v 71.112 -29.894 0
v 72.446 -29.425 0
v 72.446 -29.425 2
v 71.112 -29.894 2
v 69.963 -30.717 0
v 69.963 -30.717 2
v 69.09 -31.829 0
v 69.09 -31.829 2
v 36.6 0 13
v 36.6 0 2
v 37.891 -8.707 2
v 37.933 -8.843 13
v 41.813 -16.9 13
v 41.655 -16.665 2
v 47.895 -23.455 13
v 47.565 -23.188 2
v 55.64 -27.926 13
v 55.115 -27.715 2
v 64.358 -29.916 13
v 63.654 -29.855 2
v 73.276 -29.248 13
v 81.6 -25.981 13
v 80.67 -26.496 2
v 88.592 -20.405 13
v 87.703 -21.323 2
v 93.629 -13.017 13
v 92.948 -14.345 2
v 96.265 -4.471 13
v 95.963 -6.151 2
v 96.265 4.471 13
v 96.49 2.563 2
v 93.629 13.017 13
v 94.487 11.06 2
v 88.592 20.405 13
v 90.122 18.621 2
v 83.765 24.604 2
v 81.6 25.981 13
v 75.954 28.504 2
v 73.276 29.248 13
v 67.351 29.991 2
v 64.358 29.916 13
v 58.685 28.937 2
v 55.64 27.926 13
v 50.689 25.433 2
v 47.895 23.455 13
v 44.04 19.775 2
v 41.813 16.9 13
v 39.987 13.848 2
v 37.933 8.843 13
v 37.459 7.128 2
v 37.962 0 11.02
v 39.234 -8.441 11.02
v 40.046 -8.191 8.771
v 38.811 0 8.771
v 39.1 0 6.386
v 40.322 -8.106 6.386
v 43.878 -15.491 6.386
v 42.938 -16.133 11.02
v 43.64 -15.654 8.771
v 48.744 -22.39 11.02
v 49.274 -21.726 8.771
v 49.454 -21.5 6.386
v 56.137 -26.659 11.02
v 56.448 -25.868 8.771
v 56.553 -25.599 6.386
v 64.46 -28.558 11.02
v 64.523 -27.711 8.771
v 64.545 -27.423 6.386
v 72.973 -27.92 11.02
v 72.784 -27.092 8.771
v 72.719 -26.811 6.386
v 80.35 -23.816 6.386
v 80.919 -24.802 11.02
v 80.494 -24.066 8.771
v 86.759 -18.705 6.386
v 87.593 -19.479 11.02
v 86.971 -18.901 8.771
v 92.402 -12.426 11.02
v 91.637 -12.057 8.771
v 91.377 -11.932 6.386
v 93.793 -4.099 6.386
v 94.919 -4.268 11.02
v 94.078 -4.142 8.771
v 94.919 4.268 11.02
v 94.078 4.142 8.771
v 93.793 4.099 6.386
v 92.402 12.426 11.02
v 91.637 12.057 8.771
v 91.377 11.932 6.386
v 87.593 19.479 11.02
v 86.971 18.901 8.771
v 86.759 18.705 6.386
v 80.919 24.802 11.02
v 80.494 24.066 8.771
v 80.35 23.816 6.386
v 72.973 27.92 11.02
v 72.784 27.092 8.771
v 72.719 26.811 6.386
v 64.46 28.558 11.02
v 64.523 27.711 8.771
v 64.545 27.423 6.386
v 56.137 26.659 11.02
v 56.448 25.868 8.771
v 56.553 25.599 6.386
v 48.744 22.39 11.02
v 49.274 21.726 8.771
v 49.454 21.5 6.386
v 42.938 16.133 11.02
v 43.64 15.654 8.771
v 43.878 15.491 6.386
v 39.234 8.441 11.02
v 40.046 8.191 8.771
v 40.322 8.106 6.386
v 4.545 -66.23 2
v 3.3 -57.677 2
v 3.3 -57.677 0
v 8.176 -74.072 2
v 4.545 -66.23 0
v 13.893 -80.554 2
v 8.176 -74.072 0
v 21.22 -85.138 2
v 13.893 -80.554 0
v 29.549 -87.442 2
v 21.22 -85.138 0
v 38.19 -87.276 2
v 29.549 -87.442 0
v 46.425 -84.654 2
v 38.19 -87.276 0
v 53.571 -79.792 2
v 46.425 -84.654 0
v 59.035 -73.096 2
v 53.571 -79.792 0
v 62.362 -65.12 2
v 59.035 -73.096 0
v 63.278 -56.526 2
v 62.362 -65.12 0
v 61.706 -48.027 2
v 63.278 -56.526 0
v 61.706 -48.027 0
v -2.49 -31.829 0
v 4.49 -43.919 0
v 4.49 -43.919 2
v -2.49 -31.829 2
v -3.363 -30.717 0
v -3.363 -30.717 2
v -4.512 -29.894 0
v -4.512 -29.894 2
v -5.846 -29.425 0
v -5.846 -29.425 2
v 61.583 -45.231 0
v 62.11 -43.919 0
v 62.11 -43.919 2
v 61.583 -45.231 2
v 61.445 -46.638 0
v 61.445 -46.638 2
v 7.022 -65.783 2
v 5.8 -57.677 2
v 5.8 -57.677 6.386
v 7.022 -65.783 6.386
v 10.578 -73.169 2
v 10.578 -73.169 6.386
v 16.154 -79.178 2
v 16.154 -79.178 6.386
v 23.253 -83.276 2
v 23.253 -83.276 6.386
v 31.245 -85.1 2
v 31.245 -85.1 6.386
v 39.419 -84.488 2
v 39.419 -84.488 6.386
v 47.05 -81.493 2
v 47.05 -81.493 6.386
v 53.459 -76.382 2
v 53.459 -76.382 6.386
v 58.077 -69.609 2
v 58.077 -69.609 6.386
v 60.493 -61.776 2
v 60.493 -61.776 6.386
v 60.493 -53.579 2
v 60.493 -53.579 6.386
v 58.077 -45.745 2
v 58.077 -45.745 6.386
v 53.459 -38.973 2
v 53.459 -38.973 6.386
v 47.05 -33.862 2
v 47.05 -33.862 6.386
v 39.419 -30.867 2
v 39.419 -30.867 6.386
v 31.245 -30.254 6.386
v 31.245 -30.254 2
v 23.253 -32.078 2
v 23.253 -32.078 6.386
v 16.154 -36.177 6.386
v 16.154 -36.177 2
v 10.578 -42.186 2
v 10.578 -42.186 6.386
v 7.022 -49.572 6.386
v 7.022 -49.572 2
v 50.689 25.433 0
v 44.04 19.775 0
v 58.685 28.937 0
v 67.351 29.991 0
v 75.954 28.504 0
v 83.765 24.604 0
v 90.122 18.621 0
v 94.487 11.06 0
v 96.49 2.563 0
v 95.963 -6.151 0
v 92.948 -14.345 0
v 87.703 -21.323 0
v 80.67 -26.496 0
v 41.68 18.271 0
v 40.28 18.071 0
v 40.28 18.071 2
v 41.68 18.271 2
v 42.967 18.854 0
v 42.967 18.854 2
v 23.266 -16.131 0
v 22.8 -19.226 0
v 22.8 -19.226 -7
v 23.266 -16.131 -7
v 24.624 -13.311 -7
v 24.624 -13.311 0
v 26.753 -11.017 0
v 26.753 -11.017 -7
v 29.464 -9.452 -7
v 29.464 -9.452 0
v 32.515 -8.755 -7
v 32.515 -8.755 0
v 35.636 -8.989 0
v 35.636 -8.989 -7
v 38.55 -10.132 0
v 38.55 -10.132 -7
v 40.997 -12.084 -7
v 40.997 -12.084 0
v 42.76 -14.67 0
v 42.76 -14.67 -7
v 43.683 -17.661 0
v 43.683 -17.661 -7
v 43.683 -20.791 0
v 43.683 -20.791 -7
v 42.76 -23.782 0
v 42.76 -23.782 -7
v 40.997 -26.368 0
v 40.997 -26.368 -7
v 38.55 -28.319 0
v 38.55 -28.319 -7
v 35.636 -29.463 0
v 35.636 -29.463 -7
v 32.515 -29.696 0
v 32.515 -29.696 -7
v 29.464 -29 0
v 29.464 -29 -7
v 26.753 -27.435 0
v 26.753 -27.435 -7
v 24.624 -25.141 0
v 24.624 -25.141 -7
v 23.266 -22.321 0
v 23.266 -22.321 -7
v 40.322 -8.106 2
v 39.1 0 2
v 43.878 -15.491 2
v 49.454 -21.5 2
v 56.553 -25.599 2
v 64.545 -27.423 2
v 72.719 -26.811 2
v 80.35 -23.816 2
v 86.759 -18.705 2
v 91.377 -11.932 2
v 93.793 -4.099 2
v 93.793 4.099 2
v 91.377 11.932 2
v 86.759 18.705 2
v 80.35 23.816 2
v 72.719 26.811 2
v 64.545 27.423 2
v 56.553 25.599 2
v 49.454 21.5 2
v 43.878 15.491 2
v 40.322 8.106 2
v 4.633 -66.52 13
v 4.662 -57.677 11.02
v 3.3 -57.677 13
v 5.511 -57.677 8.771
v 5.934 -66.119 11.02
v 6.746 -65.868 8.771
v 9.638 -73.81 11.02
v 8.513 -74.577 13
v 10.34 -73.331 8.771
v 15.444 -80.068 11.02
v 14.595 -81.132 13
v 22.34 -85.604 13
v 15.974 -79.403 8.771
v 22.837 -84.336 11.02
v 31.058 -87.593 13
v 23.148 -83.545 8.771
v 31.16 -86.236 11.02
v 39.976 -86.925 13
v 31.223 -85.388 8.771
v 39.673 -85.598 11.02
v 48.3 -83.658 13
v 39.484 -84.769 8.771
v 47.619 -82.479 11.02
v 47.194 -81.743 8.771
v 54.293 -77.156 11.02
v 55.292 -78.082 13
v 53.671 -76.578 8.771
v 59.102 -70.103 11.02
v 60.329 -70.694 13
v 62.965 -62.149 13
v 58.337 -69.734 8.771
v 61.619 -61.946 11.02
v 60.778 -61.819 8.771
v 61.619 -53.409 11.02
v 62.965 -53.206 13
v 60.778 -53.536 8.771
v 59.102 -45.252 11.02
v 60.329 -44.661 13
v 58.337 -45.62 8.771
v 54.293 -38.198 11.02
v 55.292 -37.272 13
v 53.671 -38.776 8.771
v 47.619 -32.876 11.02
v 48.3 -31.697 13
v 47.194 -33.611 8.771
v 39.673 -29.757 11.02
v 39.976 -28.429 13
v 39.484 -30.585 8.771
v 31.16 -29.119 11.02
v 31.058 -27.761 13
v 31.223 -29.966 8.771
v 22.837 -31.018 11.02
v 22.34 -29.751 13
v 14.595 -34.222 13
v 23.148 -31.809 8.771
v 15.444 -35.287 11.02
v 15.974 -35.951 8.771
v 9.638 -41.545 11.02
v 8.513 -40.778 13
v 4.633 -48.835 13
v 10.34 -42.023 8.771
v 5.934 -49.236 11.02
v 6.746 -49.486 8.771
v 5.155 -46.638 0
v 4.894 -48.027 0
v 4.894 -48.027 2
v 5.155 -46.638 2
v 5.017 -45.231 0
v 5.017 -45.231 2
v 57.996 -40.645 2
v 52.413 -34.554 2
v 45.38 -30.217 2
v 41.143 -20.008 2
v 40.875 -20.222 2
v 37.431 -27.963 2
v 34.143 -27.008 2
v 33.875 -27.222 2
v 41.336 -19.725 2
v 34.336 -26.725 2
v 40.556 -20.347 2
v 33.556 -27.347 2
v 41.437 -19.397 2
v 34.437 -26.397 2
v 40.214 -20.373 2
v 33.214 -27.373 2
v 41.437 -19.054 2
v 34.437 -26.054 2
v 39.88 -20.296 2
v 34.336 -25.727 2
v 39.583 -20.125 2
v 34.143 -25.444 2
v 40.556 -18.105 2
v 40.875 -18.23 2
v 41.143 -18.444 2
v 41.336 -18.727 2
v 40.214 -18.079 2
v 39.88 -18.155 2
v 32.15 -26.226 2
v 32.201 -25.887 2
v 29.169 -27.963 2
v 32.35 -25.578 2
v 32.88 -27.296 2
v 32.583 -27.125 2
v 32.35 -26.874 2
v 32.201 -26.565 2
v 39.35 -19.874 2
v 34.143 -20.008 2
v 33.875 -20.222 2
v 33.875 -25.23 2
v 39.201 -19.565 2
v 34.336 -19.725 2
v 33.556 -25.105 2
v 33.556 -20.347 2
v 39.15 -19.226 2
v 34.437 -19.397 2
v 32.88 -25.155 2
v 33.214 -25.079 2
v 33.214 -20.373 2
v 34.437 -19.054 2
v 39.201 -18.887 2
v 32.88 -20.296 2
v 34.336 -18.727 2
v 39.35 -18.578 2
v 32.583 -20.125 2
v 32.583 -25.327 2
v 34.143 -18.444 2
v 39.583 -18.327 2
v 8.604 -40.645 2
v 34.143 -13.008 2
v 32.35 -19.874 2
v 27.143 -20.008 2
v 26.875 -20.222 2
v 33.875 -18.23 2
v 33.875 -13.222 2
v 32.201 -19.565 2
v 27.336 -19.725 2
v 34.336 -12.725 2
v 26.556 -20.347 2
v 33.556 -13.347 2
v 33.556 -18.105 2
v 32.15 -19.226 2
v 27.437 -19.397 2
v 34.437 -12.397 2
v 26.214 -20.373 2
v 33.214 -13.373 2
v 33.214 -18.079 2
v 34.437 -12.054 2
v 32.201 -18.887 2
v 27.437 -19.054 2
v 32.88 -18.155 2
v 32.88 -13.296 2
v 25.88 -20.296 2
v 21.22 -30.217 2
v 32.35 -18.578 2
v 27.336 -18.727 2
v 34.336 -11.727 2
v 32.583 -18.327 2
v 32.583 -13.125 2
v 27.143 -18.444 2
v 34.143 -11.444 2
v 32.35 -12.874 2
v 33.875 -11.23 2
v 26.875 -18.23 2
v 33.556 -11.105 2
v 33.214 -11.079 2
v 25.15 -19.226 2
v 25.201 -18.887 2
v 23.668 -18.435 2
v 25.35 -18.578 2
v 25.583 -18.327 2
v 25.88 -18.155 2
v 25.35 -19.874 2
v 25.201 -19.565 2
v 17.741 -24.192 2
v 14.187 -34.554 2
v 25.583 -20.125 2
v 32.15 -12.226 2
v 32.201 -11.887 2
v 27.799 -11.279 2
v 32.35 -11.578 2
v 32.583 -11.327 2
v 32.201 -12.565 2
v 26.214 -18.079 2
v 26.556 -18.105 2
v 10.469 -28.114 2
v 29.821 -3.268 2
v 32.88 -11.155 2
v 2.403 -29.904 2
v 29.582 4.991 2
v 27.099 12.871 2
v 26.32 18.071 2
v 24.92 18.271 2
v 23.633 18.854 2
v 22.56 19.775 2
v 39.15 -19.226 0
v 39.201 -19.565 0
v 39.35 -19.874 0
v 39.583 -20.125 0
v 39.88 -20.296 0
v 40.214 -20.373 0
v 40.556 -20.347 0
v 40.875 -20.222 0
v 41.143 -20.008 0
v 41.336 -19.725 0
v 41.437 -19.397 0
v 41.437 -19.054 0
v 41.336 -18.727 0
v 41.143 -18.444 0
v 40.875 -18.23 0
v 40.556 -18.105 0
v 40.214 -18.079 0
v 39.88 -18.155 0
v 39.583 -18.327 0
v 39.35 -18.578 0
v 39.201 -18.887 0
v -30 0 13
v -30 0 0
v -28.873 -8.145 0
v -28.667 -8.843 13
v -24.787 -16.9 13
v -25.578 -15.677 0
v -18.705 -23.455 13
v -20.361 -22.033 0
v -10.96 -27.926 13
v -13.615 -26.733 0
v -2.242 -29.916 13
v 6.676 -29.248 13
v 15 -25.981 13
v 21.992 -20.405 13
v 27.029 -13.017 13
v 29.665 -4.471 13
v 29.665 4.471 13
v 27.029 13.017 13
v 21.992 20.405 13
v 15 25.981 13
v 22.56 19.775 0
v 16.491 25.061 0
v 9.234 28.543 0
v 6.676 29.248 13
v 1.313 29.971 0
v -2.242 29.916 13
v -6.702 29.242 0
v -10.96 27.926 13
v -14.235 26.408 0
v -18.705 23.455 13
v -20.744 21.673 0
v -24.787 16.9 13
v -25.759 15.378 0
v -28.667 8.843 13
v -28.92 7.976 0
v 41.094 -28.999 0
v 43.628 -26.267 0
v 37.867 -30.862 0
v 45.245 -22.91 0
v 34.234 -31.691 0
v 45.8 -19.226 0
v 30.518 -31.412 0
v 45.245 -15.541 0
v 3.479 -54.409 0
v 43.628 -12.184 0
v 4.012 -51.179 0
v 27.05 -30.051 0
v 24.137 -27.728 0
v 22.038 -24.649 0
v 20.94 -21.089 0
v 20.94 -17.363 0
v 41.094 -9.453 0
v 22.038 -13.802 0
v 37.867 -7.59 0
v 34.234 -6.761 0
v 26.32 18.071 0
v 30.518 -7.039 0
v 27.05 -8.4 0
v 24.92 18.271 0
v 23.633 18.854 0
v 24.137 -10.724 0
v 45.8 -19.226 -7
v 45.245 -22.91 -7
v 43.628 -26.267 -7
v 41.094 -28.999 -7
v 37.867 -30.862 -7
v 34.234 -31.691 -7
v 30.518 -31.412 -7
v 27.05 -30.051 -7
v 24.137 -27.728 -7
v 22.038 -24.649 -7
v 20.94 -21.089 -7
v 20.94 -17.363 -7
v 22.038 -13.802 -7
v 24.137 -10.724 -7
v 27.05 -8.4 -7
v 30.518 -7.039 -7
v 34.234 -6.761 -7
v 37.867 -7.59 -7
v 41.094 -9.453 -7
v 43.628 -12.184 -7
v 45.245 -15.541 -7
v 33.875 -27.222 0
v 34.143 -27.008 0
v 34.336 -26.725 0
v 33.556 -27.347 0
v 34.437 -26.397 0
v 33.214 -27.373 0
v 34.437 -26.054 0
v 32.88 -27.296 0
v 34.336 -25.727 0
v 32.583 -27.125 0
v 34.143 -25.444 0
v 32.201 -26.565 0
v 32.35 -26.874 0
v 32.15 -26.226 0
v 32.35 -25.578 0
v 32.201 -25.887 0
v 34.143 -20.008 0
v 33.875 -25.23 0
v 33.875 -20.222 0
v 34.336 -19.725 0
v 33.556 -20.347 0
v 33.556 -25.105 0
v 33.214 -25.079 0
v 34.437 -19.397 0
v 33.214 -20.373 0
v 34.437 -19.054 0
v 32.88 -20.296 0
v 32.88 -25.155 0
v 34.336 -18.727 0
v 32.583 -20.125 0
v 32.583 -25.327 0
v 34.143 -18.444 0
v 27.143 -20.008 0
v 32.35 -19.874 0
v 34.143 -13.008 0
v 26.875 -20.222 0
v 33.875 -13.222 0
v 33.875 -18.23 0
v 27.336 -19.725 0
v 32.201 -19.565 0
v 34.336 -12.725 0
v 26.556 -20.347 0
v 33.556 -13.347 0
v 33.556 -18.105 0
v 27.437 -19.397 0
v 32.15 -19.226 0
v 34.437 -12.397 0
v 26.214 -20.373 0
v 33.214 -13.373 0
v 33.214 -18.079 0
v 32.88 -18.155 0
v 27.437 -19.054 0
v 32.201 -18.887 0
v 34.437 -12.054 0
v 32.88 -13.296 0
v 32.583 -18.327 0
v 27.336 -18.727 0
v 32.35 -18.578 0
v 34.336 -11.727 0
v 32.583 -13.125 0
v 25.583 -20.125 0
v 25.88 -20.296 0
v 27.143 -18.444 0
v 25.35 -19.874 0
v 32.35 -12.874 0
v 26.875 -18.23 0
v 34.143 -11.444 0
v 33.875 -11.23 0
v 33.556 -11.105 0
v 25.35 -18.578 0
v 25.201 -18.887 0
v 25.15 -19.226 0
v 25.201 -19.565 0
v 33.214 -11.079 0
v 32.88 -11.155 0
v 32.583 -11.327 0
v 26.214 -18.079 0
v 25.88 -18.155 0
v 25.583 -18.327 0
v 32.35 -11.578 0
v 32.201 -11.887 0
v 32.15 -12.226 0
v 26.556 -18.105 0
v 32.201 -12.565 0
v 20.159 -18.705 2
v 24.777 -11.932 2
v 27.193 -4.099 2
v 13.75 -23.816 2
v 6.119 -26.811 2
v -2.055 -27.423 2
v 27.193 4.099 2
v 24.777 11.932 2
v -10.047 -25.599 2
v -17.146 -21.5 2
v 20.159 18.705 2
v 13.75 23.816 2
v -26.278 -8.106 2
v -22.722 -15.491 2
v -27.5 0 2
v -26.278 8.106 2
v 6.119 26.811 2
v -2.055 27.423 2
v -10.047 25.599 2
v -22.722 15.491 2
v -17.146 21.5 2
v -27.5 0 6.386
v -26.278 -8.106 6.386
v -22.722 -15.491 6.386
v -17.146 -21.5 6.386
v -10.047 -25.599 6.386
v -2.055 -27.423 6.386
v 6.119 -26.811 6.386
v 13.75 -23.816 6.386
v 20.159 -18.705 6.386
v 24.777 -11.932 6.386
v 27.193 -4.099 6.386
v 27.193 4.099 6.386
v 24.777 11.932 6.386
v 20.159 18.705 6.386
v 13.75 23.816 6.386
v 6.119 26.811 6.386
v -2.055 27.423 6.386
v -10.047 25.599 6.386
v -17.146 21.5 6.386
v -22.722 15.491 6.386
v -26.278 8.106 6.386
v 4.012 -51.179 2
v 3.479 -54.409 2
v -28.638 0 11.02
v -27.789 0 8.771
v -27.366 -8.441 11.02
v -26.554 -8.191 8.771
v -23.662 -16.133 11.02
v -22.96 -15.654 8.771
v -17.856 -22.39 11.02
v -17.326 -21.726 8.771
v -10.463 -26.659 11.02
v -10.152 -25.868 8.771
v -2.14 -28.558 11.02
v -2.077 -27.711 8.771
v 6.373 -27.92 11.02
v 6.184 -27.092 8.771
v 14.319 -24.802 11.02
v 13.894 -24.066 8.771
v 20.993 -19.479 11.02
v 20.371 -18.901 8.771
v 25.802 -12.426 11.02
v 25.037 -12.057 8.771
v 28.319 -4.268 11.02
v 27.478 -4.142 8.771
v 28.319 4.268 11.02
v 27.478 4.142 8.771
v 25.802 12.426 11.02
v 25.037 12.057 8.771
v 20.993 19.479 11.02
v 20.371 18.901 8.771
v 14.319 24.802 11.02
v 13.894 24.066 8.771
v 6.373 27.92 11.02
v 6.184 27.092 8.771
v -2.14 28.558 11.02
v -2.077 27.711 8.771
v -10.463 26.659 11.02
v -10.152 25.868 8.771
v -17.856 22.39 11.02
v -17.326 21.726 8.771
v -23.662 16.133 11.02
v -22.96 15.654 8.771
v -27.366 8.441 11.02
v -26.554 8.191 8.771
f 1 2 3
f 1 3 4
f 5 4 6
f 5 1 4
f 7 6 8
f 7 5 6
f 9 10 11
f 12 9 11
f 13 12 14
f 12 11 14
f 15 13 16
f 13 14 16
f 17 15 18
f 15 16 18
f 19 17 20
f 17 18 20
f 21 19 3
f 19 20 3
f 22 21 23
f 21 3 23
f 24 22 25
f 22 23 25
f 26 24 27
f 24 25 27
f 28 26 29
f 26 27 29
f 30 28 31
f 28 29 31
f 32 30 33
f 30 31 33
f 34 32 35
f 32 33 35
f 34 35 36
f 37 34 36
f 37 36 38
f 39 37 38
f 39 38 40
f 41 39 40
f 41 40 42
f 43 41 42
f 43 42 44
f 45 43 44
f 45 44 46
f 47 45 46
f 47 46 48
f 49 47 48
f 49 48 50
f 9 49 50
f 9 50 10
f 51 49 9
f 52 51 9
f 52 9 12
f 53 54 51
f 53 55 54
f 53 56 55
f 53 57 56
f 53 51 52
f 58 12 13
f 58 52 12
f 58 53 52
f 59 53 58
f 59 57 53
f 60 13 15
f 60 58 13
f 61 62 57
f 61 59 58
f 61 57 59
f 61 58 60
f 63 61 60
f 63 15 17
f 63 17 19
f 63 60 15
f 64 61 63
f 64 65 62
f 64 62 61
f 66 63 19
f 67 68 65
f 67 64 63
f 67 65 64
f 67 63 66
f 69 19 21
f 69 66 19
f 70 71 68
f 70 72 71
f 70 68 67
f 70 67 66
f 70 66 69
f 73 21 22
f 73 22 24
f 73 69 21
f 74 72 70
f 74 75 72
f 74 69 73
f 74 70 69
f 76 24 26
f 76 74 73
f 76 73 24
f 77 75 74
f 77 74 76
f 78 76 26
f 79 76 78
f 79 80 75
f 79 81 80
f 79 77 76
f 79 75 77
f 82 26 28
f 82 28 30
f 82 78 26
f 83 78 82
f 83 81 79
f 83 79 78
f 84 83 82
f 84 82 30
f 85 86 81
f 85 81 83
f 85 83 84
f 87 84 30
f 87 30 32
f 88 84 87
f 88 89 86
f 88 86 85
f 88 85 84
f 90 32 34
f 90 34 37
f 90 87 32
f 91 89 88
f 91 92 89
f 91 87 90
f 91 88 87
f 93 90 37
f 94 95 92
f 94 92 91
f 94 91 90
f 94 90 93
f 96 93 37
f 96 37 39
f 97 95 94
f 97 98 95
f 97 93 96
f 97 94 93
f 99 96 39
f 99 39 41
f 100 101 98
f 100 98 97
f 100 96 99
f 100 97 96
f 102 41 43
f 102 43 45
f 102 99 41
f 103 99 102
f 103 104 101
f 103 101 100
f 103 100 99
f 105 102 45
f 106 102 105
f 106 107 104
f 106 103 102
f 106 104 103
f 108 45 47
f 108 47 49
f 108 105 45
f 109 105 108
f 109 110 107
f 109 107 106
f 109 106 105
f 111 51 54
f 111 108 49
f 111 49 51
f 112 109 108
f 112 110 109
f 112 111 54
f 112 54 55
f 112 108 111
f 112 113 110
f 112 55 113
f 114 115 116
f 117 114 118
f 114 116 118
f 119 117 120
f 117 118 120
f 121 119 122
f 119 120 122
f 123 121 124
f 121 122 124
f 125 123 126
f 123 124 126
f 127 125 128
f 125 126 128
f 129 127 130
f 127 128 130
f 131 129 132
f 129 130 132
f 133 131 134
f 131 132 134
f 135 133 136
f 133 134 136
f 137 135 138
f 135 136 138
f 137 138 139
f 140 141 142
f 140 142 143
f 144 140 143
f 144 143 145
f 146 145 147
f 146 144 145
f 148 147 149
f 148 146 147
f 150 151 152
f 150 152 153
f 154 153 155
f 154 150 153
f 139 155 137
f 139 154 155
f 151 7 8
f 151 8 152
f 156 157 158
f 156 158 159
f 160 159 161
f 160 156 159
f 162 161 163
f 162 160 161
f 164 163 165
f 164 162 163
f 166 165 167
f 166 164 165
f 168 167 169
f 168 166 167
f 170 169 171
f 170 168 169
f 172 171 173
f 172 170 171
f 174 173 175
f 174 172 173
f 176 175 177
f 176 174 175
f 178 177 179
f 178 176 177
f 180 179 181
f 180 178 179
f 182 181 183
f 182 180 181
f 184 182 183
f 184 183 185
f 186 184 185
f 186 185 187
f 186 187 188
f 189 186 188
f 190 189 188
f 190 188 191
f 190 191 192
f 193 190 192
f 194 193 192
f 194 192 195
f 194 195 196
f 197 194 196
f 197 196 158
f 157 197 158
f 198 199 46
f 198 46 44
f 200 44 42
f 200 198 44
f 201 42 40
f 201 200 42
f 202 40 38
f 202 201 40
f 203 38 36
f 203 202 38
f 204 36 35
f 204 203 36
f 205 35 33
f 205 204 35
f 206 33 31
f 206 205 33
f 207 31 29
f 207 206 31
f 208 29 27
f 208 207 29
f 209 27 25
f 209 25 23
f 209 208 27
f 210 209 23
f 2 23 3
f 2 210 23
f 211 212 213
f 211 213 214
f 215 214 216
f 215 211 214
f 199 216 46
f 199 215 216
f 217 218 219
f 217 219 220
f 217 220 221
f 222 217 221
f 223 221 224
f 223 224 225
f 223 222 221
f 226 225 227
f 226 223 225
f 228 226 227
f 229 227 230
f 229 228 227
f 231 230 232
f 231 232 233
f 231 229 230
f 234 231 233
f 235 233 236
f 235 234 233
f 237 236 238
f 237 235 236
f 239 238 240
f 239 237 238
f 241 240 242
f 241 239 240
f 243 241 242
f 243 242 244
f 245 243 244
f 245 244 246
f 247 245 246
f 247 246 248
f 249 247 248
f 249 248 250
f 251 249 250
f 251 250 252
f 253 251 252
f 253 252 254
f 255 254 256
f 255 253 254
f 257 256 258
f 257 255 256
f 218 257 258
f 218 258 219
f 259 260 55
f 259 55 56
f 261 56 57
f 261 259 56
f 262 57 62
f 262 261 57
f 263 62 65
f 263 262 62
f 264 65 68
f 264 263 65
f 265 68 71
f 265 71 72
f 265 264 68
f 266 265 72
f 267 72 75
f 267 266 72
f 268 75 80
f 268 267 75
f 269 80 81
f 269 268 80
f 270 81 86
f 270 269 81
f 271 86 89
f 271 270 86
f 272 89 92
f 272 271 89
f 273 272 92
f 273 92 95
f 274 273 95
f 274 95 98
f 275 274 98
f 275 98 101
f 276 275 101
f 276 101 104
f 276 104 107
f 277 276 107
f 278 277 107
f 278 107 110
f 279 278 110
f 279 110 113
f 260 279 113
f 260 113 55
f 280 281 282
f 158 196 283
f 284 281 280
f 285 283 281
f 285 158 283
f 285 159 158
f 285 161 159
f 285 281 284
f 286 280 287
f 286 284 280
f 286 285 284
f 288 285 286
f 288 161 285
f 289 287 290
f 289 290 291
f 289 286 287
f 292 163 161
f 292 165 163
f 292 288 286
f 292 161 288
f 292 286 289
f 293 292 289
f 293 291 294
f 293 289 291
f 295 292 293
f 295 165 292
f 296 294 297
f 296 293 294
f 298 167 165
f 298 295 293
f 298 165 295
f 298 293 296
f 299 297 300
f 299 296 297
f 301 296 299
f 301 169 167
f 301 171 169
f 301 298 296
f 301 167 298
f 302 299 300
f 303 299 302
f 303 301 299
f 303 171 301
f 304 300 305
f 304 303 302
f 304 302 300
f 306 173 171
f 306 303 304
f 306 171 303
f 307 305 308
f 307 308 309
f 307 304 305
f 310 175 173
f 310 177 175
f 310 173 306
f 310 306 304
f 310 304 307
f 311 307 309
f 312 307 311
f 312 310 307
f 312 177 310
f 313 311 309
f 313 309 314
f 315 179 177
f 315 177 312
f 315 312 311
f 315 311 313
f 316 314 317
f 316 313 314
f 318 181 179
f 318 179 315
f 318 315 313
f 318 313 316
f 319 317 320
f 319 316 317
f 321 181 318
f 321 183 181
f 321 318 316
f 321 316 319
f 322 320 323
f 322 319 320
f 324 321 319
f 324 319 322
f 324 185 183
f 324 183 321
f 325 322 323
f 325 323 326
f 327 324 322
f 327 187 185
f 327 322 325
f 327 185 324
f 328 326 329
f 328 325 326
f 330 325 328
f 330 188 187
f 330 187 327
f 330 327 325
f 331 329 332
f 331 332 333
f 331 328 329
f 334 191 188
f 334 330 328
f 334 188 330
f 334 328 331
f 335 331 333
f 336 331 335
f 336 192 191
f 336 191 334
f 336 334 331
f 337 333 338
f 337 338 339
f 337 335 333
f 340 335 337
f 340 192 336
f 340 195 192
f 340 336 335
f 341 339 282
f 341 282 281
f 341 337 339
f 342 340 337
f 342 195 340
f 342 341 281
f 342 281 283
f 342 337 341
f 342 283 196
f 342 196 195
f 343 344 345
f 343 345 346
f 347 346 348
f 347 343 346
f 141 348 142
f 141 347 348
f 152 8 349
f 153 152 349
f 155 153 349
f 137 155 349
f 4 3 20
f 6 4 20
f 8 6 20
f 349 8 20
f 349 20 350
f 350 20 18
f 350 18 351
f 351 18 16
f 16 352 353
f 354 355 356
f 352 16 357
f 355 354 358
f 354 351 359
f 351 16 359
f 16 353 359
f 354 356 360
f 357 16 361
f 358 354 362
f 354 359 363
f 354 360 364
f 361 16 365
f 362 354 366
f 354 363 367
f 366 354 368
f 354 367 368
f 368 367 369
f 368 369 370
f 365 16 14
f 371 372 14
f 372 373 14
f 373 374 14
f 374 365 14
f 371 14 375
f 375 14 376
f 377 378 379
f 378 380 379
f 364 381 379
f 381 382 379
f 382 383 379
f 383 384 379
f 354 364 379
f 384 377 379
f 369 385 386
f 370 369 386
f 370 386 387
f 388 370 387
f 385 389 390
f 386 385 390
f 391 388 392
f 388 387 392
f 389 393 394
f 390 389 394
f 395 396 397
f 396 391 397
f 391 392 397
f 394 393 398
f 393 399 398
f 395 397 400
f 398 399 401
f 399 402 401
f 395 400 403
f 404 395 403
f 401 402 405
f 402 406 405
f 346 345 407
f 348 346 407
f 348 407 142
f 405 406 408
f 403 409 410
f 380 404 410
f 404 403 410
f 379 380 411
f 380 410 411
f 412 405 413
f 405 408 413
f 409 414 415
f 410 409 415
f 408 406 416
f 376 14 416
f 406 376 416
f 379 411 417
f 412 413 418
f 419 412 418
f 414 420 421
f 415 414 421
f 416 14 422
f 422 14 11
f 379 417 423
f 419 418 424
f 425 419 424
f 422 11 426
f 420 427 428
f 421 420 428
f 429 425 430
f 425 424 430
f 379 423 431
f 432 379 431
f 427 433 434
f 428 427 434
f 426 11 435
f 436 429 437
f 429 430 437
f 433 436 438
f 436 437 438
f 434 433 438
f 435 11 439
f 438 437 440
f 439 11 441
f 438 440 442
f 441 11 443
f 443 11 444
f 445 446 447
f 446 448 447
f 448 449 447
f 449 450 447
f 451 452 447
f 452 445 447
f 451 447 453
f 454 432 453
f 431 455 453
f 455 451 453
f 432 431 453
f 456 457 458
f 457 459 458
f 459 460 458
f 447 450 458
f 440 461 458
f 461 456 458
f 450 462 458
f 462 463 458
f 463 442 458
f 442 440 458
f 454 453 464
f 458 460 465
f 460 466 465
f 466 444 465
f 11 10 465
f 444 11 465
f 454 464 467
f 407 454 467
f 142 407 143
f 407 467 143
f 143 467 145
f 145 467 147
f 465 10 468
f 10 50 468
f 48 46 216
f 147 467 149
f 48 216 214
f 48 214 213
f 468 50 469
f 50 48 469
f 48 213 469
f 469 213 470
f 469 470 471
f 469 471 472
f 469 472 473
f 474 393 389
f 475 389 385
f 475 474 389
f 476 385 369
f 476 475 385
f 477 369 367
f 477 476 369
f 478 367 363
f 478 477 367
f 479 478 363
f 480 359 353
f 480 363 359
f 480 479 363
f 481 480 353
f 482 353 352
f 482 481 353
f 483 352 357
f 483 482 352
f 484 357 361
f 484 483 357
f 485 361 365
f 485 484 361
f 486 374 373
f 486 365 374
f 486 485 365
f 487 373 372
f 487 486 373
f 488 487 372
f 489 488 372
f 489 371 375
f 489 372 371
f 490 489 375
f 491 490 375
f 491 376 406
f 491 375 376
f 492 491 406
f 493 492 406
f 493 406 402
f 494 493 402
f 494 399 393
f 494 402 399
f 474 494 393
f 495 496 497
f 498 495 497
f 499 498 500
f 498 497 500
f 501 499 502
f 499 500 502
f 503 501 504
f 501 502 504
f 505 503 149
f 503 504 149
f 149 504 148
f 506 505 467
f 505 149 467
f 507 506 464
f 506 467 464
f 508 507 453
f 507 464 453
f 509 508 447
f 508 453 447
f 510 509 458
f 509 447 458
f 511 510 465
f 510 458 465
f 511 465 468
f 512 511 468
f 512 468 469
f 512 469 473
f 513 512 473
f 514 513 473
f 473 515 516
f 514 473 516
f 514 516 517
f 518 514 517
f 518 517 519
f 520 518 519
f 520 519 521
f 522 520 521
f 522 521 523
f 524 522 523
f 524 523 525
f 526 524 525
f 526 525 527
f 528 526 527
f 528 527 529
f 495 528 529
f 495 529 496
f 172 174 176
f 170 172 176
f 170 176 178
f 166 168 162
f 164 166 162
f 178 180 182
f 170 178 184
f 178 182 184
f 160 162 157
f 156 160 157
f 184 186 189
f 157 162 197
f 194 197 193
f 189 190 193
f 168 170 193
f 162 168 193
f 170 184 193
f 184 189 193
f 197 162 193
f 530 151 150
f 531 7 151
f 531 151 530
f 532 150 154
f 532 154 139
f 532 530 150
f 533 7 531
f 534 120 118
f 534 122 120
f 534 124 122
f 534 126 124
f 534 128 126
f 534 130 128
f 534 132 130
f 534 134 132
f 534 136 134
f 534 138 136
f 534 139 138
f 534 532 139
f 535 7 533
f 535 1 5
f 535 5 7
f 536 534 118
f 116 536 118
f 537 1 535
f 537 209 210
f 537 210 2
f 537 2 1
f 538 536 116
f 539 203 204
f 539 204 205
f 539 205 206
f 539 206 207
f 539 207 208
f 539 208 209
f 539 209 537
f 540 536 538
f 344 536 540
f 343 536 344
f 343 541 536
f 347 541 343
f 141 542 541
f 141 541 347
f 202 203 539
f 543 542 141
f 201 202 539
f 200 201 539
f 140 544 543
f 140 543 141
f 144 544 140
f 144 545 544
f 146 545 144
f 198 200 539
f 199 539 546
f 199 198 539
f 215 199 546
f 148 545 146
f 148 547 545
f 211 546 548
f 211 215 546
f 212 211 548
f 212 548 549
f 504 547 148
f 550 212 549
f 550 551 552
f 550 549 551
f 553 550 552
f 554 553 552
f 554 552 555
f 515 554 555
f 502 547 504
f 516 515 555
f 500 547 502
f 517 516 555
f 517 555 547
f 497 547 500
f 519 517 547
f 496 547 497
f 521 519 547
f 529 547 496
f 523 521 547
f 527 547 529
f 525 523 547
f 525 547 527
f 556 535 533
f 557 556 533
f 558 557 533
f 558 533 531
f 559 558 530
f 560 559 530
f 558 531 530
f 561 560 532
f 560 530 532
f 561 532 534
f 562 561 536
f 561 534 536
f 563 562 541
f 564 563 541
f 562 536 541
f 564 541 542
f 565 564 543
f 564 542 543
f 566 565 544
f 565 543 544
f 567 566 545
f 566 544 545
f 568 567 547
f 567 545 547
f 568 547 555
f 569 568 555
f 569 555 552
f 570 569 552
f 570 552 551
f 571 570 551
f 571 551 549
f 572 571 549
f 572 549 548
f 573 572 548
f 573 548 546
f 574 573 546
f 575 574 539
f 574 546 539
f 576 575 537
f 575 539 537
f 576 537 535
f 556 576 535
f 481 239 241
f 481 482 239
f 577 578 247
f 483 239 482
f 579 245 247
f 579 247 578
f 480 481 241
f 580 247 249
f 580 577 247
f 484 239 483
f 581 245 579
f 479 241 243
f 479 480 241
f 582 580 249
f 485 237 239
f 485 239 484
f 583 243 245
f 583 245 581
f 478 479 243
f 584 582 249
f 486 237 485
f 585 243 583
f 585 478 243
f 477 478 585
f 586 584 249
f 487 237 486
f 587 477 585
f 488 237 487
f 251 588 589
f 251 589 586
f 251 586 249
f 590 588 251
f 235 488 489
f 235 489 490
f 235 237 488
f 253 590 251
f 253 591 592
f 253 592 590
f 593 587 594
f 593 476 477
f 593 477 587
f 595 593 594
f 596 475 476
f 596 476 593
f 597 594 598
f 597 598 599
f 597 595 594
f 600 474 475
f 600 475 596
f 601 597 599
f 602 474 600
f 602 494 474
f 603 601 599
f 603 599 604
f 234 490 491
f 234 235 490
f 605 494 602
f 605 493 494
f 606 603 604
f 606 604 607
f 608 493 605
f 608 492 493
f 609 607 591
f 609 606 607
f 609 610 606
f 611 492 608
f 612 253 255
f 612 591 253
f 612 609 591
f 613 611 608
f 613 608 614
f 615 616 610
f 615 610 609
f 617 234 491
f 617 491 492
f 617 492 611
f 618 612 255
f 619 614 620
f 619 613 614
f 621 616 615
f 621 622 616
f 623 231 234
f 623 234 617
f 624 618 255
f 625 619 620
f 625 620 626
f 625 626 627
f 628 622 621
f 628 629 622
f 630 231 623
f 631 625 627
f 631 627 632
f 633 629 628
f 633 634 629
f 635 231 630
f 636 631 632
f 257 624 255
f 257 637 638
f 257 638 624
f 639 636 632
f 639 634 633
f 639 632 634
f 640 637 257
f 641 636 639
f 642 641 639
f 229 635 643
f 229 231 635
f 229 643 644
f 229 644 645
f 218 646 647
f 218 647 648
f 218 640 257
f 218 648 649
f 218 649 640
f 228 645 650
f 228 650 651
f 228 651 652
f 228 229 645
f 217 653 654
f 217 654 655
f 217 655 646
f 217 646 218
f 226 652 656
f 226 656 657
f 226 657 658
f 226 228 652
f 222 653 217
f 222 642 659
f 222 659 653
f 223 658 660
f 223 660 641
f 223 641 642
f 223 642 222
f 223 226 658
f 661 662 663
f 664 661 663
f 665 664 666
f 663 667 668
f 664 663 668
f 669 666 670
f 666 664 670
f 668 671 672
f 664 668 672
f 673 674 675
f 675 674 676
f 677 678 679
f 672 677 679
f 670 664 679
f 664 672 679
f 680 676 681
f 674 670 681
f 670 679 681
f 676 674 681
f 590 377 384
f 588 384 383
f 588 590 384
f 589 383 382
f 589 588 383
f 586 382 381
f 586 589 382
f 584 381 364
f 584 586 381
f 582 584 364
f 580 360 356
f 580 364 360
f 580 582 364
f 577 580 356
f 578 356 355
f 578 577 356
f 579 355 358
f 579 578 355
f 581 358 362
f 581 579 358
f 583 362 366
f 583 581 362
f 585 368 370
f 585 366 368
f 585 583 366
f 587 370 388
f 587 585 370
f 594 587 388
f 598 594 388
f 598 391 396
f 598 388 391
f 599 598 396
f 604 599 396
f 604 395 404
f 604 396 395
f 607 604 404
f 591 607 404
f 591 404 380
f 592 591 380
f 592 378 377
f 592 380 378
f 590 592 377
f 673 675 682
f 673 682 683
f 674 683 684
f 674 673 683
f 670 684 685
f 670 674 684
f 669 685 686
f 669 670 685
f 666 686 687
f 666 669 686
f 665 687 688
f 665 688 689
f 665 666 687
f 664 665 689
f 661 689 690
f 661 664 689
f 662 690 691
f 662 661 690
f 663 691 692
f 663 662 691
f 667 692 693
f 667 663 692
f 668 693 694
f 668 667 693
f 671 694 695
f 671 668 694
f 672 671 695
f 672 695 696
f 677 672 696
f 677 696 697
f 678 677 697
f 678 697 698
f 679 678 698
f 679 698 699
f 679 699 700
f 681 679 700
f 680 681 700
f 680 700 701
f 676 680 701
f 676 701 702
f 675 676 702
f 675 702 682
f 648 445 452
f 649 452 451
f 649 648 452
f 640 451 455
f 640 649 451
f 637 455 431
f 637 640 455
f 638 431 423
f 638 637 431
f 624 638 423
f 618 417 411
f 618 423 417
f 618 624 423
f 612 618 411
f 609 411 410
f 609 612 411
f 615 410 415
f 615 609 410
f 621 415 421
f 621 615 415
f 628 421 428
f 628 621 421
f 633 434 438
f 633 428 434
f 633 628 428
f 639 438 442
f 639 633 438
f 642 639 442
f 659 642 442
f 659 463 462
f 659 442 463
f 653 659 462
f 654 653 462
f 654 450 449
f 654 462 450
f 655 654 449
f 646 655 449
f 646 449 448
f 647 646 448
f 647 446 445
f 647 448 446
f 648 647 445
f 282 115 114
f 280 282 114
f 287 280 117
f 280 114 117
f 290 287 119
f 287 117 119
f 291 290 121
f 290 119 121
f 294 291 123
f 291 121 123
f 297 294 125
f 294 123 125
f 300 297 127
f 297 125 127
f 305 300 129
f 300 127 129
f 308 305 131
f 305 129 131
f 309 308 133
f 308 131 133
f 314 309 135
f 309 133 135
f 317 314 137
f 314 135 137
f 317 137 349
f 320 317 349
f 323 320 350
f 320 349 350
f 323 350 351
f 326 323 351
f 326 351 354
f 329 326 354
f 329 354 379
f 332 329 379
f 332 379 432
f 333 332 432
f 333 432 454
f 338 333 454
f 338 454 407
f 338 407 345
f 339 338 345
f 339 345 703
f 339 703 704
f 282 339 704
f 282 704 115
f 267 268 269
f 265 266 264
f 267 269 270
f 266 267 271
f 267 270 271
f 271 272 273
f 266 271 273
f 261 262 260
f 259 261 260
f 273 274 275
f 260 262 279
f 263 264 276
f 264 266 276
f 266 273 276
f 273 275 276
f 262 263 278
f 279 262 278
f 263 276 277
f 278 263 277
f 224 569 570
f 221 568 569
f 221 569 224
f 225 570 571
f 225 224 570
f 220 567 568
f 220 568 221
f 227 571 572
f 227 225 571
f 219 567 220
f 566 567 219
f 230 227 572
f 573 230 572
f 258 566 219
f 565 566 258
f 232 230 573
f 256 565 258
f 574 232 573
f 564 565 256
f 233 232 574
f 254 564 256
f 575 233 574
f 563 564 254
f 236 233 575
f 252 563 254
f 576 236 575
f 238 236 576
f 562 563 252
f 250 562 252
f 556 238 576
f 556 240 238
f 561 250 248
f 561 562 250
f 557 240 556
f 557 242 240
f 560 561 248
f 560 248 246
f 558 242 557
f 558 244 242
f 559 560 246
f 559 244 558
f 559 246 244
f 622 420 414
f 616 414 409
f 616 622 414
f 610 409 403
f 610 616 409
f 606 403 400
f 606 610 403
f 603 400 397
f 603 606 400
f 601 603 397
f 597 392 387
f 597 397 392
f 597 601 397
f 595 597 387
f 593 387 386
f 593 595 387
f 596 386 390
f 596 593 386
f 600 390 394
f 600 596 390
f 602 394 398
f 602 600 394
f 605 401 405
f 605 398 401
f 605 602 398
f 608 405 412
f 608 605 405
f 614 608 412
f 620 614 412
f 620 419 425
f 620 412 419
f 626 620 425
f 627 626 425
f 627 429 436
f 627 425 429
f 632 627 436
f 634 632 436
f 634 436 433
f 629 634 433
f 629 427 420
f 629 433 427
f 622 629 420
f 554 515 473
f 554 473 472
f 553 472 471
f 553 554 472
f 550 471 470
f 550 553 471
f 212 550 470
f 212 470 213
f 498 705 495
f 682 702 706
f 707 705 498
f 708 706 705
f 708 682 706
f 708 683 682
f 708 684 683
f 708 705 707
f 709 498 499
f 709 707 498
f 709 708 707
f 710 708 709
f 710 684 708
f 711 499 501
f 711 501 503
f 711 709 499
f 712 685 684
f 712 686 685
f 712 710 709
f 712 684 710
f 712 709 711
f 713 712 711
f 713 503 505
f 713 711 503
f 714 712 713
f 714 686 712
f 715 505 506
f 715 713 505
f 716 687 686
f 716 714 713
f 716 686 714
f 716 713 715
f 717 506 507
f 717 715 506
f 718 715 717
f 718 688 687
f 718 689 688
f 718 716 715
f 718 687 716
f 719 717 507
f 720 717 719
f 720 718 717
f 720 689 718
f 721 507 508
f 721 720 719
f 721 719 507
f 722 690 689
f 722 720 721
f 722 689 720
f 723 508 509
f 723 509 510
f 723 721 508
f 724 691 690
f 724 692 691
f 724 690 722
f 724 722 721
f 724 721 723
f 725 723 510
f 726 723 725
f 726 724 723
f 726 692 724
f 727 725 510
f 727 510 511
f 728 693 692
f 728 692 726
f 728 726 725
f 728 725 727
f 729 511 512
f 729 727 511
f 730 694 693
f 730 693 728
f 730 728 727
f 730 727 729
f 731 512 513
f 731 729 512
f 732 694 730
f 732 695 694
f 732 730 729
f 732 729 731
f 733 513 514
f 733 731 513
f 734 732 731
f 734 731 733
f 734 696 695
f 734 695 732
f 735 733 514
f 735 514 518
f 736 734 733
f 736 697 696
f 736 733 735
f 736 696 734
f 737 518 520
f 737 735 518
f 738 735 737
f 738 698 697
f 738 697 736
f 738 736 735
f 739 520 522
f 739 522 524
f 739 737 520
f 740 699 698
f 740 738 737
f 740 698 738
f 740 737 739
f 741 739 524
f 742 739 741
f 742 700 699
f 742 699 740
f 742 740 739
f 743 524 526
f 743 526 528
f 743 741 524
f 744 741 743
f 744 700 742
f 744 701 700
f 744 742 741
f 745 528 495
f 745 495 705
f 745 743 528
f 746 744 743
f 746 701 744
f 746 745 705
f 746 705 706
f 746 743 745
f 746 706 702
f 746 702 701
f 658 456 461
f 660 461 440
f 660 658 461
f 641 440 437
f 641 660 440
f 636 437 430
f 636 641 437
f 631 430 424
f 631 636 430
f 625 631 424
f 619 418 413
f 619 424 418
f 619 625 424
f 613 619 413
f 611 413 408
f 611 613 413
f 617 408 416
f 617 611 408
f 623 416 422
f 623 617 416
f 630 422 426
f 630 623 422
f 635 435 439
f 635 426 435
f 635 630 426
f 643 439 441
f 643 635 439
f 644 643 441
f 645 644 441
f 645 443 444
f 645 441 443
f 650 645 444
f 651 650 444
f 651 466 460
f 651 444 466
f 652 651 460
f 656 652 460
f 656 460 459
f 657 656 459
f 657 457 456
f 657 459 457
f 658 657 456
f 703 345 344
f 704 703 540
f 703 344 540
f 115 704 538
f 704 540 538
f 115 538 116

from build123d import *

# Parameters (mm, degrees)
SKETCH_1_R          = 30
SKETCH_1_R_2        = 27.5
EXTRUDE_1_DEPTH     = 13
SKETCH_1_R_3        = 29.999999999999996
EXTRUDE_1_2_DEPTH   = 13
EXTRUDE_1_3_DEPTH   = 13
EXTRUDE_2_DEPTH     = 2
SKETCH_3_R          = 1.149999999999996
SKETCH_3_R_2        = 1.1499999999999966
SKETCH_3_R_3        = 1.1500000000000037
CUT_EXTRUDE_5_DEPTH = 132.10250765535577
FILLET_1_R          = 10
SKETCH_5_R          = 12.500000000000002
SKETCH_5_R_2        = 10.5
EXTRUDE_3_DEPTH     = 7


with BuildPart() as part:
    # 草图1 → 凸台-拉伸1 (new body)
    with BuildSketch(Plane.XY):
        with Locations(Location((0, 0, 0), (0, 0, 180))):
            Circle(SKETCH_1_R)
        with Locations(Location((0, 0, 0), (0, 0, 180))):
            Circle(SKETCH_1_R_2, mode=Mode.SUBTRACT)
    extrude(amount=EXTRUDE_1_DEPTH)



with BuildPart() as body_2:
    # 草图1 → Extrude 1 2 (new body)
    with BuildSketch(Plane.XY):
        with Locations(Location((66.6, 0, 0), (0, 0, 180))):
            Circle(SKETCH_1_R_3)
        with Locations(Location((66.6, 0, 0), (0, 0, 180))):
            Circle(SKETCH_1_R_2, mode=Mode.SUBTRACT)
    extrude(amount=EXTRUDE_1_2_DEPTH)


with BuildPart() as body_3:
    # 草图1 → Extrude 1 3 (new body)
    with BuildSketch(Plane.XY):
        with Locations(Location((33.30000000000001, -57.6772918920436, 0), (0, 0, 180))):
            Circle(SKETCH_1_R_3)
        with Locations(Location((33.30000000000001, -57.6772918920436, 0), (0, 0, 180))):
            Circle(SKETCH_1_R_2, mode=Mode.SUBTRACT)
    extrude(amount=EXTRUDE_1_3_DEPTH)


with BuildPart() as part_1:
    add(part.part)

    add(body_2.part)  # 凸台-拉伸2 merges body 2

    add(body_3.part)  # 凸台-拉伸2 merges body 3
    # 草图2 → 凸台-拉伸2 (add)
    with BuildSketch(Plane.XY):
        with BuildLine():
            Line((26.3198925252566, 18.070831312697457), (40.280107474743396, 18.070831312697457))
            ThreePointArc((40.280107474743396, 18.070831312697457), (42.3441853289733, 18.516758123597654), (44.04009212120862, 19.77499826802639))
            ThreePointArc((44.04009212120862, 19.77499826802639), (92.58076211353317, 15), (72.44569692050842, -29.424952464083248))
            ThreePointArc((72.44569692050842, -29.424952464083248), (70.50807559525407, -30.264530756395246), (69.08985272167097, -31.829111208097117))
            Line((69.08985272167097, -31.829111208097117), (62.10974524692759, -43.91901199664395))
            ThreePointArc((62.10974524692759, -43.91901199664395), (61.46389026628078, -45.92951925924603), (61.70560479929982, -48.027337695986766))
            ThreePointArc((61.70560479929982, -48.027337695986766), (33.300000000000004, -87.6772918920436), (4.894395200700185, -48.02733769598677))
            ThreePointArc((4.894395200700185, -48.02733769598677), (5.13610973371921, -45.92951925924604), (4.4902547530724135, -43.91901199664397))
            Line((4.4902547530724135, -43.91901199664397), (-2.489852721670984, -31.829111208097103))
            ThreePointArc((-2.489852721670984, -31.829111208097103), (-3.9080755952540875, -30.264530756395228), (-5.845696920508439, -29.42495246408323))
            ThreePointArc((-5.845696920508439, -29.42495246408323), (-25.980762113533153, 15.000000000000009), (22.55990787879137, 19.77499826802639))
            ThreePointArc((22.55990787879137, 19.77499826802639), (24.25581467102669, 18.516758123597654), (26.3198925252566, 18.070831312697457))
        make_face()
    extrude(amount=EXTRUDE_2_DEPTH)

    # 草图3 → 切除-拉伸5 (cut, through all)
    with BuildSketch(Plane.XY):
        with Locations(Location((33.3, -19.225763964014533, 0), (0, 0, 180))):
            Circle(SKETCH_3_R)
        with Locations(Location((33.3, -12.225763964014533, 0), (0, 0, 180))):
            Circle(SKETCH_3_R_2)
        with Locations(Location((40.3, -19.225763964014533, 0), (0, 0, 180))):
            Circle(SKETCH_3_R)
        with Locations(Location((33.3, -26.22576396401453, 0), (0, 0, 180))):
            Circle(SKETCH_3_R)
        with Locations(Location((26.299999999999997, -19.225763964014533, 0), (0, 0, 180))):
            Circle(SKETCH_3_R_3)
    extrude(amount=CUT_EXTRUDE_5_DEPTH, mode=Mode.SUBTRACT)

    # 圆角1
    # the kernel refuses this fillet: 10 mm, written as the material it takes off along each edge
    with BuildSketch(Plane(origin=(0, 0, 13), x_dir=(-1, 1.2e-16, 0), z_dir=(1.2e-16, 1, 0))) as fillet_1_piece_1:
        with BuildLine():
            CenterArc((37.5, -6.614378277661482), FILLET_1_R, 138.59037789072914, 41.409622109270856)
            Line((27.5, -6.614378277661482), (27.3, -6.614378277661482))
            Line((27.3, -6.614378277661482), (27.3, 0))
            Line((27.3, 0), (27.5, 0.1999999999999993))
            ThreePointArc((27.5, 0.1999999999999993), (28.75, 0.1999999999999993), (29.85, 0.1322875655532254))
            Line((29.85, 0.1322875655532254), (30, -3.55e-15))
        make_face()
    revolve(axis=Axis((0, 0, 13), (0, 0, 1)), mode=Mode.SUBTRACT)
    with BuildSketch(Plane(origin=(66.6, 0, 13), x_dir=(-1, 1.2e-16, 0), z_dir=(1.2e-16, 1, 0))) as fillet_1_piece_2:
        with BuildLine():
            CenterArc((37.5, -6.614378277661482), FILLET_1_R, 138.59037789072914, 41.409622109270856)
            Line((27.5, -6.614378277661482), (27.299999999999997, -6.614378277661482))
            Line((27.299999999999997, -6.614378277661482), (27.299999999999997, 0))
            Line((27.299999999999997, 0), (27.5, 0.1999999999999993))
            ThreePointArc((27.5, 0.1999999999999993), (28.75, 0.1999999999999993), (29.85, 0.1322875655532254))
            Line((29.85, 0.1322875655532254), (30, -3.55e-15))
        make_face()
    revolve(axis=Axis((66.6, 0, 13), (0, 0, 1)), mode=Mode.SUBTRACT)
    with BuildSketch(Plane(origin=(33.30000000000001, -57.6772918920436, 13), x_dir=(-1, 0, 0), z_dir=(0, 1, 0))) as fillet_1_piece_3:
        with BuildLine():
            CenterArc((37.5, -6.614378277661478), FILLET_1_R, 138.59037789072914, 41.409622109270856)
            Line((27.5, -6.614378277661478), (27.3, -6.614378277661478))
            Line((27.3, -6.614378277661478), (27.3, 0))
            Line((27.3, 0), (27.5, 0.1999999999999993))
            ThreePointArc((27.5, 0.1999999999999993), (28.75, 0.1999999999999993), (29.849999999999998, 0.1322875655532254))
            Line((29.849999999999998, 0.1322875655532254), (30, -3.55e-15))
        make_face()
    revolve(axis=Axis((33.30000000000001, -57.6772918920436, 13), (0, 0, 1)), mode=Mode.SUBTRACT)

    # 草图5 → 凸台-拉伸3 (add)
    with BuildSketch(Plane(origin=(0, 0, 0), x_dir=(-1, 0, 0), z_dir=(0, 0, -1))):
        with Locations(Location((-33.3, -19.225763964014533, 0), (0, 0, 180))):
            Circle(SKETCH_5_R)
        with Locations((-33.3, -19.225763964014533)):
            Circle(SKETCH_5_R_2, mode=Mode.SUBTRACT)
    extrude(amount=EXTRUDE_3_DEPTH)


solid = part_1.part
